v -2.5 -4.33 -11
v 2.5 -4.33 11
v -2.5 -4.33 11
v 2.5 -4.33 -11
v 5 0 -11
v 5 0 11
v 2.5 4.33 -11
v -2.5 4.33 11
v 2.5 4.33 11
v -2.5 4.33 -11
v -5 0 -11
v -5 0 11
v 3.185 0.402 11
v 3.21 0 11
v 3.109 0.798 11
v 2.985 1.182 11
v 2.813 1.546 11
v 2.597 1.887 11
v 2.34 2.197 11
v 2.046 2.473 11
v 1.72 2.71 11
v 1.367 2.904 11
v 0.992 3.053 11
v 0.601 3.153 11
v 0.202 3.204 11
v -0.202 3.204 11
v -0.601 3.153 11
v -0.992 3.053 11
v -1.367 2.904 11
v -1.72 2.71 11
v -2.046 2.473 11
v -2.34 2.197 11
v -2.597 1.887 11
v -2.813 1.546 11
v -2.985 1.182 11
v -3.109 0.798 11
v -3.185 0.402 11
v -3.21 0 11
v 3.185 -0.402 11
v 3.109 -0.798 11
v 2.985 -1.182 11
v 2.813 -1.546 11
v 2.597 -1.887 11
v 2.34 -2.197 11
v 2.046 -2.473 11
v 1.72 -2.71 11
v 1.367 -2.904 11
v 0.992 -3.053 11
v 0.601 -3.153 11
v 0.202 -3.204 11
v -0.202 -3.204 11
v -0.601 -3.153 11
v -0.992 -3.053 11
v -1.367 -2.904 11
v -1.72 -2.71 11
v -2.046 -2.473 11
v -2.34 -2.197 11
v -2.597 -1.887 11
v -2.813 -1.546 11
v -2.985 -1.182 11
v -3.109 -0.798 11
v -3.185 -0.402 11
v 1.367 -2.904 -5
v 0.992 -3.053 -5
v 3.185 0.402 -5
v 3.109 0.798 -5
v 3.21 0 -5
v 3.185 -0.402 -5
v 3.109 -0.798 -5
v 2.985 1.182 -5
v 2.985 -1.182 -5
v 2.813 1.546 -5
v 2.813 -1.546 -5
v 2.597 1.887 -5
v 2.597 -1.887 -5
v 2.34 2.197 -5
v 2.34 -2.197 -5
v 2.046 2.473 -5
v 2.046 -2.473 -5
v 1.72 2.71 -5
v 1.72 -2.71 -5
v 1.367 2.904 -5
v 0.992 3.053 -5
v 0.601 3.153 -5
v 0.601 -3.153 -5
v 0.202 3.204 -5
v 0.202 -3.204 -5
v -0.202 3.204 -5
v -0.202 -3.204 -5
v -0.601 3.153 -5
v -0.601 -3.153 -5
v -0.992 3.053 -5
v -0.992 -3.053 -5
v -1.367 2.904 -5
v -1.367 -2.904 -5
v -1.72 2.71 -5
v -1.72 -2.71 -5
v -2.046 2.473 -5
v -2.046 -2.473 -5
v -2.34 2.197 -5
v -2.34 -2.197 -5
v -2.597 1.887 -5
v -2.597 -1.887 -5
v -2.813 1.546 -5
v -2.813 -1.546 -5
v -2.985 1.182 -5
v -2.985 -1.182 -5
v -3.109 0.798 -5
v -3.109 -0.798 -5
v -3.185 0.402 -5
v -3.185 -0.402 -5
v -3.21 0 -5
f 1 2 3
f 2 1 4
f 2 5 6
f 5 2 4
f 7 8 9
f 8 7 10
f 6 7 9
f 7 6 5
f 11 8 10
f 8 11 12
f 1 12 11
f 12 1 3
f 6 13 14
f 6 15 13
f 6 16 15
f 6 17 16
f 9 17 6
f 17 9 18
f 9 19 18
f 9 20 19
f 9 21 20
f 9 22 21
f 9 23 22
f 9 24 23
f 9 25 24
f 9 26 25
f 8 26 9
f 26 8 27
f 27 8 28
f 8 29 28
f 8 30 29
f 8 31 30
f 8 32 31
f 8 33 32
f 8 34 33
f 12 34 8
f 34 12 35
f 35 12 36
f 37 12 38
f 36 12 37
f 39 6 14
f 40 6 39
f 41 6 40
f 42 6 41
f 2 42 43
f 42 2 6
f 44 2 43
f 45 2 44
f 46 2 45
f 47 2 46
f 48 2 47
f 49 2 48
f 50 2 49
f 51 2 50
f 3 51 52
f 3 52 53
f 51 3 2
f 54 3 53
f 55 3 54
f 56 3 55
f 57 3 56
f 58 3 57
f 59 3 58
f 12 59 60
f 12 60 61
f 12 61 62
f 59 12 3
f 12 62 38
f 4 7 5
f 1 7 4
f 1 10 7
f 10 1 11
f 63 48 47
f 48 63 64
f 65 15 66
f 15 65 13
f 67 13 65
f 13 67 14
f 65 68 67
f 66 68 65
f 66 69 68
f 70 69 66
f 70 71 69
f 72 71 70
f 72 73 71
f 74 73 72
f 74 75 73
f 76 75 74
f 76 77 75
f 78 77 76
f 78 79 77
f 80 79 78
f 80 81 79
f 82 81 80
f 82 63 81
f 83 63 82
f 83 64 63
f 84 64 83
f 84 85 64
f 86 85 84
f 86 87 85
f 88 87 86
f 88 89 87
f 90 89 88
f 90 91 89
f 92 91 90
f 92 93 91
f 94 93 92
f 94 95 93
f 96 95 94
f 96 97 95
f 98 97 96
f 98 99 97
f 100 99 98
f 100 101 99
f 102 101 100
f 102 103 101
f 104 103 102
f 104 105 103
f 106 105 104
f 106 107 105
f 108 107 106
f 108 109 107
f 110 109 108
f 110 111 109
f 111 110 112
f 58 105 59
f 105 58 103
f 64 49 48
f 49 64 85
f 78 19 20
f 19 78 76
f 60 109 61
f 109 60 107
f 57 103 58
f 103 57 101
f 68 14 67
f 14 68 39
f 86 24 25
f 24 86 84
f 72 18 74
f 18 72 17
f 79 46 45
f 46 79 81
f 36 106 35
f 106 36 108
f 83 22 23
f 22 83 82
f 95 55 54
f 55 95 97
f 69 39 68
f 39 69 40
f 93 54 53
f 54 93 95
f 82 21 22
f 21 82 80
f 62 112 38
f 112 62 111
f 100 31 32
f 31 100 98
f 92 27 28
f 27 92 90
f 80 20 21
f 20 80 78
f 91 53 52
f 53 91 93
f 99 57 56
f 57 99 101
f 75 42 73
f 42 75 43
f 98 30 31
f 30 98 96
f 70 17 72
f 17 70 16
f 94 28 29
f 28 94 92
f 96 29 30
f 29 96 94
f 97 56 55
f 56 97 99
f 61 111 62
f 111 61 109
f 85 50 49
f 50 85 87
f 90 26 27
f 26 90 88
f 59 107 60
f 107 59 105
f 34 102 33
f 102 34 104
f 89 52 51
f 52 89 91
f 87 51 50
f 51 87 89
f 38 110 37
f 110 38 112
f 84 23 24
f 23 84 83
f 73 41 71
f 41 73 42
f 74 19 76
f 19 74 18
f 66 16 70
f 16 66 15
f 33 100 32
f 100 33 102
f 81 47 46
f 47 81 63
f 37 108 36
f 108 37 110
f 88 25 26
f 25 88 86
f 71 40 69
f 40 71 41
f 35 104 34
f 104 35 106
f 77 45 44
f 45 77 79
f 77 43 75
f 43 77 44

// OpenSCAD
$fn=50;
//translate([0,0,-5]){
//cube([15,15,5],center=true);}
difference()
{
    Polygon(N=6,R=5,h=22);
    translate([0,0,-5])
     {cylinder(r=3.21,h=16);} //Shaft_hole
}
//-----------------------------//
// Polygon : 
module Polygon(N=3,A=0,R=0,S=0,h=0,debug=false)
{
	N = ( N < 3 ? 3 : N );
	angle = 360/N;
	angleA = angle/2;
	if ( A > 0 )		// if A assign R and S
	{
        S = 2 * A * tan(angleA); // assign
		//R = (S/2) / sin(angleA); // no assign ???
		R = ( A * tan(angleA) ) / sin(angleA);	// asign
		_Build_Polygon(N=N,R=R,h=h);
	}
	else
	{
		if ( S > 0 )		// if S assign R and A
		{
			R = (S/2) / sin(angleA); // assign
			A = S / ( 2 * tan(angleA) ); // assign
            _Build_Polygon(N=N,R=R,h=h);
		}
		else
		{
			if ( R == 0 )		// default
			{
				S = 2 * R * sin(angleA); // no assign ???
				A = S / ( 2 * tan(angleA) ); // no assign ???
				_Build_Polygon(N=N,h=h);
			}
			else		// build with R
			{
				S = 2 * R * sin(angleA);
				A = S / ( 2 * tan(angleA) );	// no assign ???
				//A = R * ( sin(angleA) / tan(angleA) )	// no assign ???
				_Build_Polygon(N=N,R=R,h=h);
			}
		}
	}
}

// Build
module _Build_Polygon(N=3,R=1,h=0)
{
	if (h > 0)
	{
		// 3D primitive h>0
		cylinder(r=R,h=h,$fn=N,center=true);
	}
	else
	{
		// 2D primitive h=0
		circle(r=R,$fn=N,center=true);
	}
}
/*
	Definition

	N = Number of Side N >=3
	A = apothem
		radius of inside circle
	R = circumradius
		Radius of outside circle
	S = Side
		Lenght of a side

	Build polygon with the Apothem :
	N and A is known
	Need to calculate S then R
	use $fn

	Build Polygon with Circumradius
	N and R known
	use $fn

	Build Polygon with Side
	N and S Known
	Need to calculate R and optionaly A
	use $fn	

	TO DO
    Control result

	For more information :
	http://en.wikipedia.org/wiki/Regular_polygon

*/
